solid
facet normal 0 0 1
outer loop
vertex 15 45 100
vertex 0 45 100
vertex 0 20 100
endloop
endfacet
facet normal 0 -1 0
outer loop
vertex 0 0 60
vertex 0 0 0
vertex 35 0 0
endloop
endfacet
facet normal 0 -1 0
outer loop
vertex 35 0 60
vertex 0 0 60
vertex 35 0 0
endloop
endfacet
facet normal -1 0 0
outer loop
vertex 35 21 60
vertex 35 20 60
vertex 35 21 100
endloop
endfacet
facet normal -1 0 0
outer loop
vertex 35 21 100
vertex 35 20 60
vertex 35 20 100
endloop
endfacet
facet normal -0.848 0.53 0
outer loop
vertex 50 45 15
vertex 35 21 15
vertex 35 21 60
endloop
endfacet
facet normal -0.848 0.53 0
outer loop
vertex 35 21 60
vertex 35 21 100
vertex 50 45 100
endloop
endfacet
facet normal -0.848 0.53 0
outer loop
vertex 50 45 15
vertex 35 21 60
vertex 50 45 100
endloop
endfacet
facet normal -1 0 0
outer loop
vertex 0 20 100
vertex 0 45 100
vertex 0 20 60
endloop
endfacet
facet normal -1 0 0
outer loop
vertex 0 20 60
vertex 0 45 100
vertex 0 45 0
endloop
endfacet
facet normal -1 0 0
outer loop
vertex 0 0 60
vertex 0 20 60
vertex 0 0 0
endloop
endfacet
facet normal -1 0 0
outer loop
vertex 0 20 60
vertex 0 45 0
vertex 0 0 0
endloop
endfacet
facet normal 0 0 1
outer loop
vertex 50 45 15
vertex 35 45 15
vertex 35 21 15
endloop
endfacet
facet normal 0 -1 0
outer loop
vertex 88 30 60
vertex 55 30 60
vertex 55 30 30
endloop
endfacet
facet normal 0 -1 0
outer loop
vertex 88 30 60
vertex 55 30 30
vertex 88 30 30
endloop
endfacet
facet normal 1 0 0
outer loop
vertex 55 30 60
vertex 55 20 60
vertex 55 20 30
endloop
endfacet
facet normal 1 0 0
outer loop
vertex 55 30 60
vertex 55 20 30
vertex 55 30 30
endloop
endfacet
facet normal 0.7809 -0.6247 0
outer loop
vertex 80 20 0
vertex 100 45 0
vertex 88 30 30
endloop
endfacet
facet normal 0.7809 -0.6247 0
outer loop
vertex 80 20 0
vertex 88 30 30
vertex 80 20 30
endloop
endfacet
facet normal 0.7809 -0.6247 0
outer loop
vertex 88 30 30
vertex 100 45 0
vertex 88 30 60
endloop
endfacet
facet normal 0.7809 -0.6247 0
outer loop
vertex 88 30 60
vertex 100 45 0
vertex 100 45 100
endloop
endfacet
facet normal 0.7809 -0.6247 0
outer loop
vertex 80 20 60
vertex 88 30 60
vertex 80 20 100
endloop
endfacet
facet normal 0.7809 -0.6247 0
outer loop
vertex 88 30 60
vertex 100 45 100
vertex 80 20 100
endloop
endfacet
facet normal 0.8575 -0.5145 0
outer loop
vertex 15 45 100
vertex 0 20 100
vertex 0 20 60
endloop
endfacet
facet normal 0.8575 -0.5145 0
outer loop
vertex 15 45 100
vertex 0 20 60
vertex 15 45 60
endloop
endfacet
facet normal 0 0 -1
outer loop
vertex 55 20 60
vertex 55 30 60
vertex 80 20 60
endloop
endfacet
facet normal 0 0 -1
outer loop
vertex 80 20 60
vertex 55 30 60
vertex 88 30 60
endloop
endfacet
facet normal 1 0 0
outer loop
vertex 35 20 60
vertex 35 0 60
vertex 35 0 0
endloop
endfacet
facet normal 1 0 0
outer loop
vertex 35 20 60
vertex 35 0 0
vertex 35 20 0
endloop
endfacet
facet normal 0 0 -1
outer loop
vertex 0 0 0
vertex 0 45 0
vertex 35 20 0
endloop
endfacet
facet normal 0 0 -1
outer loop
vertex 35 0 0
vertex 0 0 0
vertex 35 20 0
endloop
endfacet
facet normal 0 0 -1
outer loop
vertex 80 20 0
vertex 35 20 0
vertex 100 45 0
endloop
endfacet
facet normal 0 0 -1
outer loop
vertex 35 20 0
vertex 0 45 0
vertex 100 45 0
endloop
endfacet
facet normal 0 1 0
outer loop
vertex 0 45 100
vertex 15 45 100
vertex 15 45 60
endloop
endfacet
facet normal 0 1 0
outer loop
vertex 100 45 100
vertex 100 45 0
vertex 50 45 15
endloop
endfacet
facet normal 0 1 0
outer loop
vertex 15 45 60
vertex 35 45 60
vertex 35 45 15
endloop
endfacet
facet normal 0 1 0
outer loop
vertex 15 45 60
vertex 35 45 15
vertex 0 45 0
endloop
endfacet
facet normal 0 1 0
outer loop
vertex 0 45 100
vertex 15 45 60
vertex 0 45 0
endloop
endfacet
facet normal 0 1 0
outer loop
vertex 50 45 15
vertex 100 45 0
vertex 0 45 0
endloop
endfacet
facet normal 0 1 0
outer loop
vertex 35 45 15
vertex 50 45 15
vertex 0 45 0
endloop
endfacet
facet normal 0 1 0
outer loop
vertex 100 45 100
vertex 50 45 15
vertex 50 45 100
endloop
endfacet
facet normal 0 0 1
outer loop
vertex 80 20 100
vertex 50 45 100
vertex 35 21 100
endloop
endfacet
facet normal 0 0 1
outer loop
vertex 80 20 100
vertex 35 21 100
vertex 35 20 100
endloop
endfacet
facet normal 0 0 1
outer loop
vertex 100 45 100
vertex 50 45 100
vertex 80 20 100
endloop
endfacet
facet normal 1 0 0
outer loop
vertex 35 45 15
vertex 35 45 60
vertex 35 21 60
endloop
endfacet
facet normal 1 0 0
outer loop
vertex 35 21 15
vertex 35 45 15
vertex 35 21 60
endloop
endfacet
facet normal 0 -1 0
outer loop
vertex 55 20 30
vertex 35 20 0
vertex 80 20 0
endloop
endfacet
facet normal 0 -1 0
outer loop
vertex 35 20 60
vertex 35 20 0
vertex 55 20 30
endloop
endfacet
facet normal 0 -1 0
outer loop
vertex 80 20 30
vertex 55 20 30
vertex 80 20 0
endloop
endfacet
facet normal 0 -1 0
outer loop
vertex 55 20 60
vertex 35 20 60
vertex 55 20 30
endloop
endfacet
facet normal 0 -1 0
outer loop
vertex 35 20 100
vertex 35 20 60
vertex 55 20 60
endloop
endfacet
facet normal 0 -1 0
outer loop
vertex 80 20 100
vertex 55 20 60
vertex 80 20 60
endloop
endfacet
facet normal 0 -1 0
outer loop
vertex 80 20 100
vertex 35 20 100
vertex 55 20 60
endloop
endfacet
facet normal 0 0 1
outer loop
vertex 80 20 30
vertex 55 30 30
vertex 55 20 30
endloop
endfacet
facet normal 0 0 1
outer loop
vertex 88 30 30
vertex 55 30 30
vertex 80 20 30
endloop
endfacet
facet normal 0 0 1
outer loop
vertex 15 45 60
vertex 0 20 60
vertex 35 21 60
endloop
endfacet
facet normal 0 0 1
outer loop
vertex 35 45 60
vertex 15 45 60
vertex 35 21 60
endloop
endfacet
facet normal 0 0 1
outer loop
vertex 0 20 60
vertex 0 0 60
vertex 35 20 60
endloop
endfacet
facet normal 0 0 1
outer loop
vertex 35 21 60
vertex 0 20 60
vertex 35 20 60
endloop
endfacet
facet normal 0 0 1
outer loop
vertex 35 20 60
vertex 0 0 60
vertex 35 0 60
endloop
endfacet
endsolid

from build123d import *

# Parameters (mm, degrees)
F0_W      = 100
F0_H      = 45
F1_DEPTH  = 100
F2_W      = 65
F2_H      = 20
F3_DEPTH  = 100.001
F4_W      = 35
F4_H      = 40
F5_DEPTH  = 45.001
F7_DEPTH  = 40
F9_DEPTH  = 85
F10_W     = 33
F10_H     = 10
F11_DEPTH = 70
F12_W     = 33
F12_H     = 40
F13_DEPTH = 10
F15_DEPTH = 100.001


with BuildPart() as f1:
    # F0 (on Top) → F1 (new body)
    with BuildSketch(Plane.XY):
        with Locations((50, 22.5)):
            Rectangle(F0_W, F0_H)
    extrude(amount=F1_DEPTH)

    # F2 (on face) → F3 (cut, through all)
    with BuildSketch(Plane.XY.offset(100)):
        with Locations((67.5, 10)):
            Rectangle(F2_W, F2_H)
    extrude(amount=-F3_DEPTH, mode=Mode.SUBTRACT)

    # F4 (on face) → F5 (cut, through all)
    with BuildSketch(Plane.XZ):
        with Locations((17.5, 80)):
            Rectangle(F4_W, F4_H)
    extrude(amount=-F5_DEPTH, mode=Mode.SUBTRACT)

    # F6 (on face) → F7 (join)
    with BuildSketch(Plane.XY.offset(60)):
        Polygon((0, 20), (15, 45), (0, 45), align=None)
    extrude(amount=F7_DEPTH)

    # F8 (on face) → F9 (cut)
    with BuildSketch(Plane.XY.offset(100)):
        Polygon((35, 21), (50, 45), (35, 45), align=None)
    extrude(amount=-F9_DEPTH, mode=Mode.SUBTRACT)

    # F10 (on face) → F11 (cut)
    with BuildSketch(Plane.XY.offset(100)):
        with Locations((71.5, 25)):
            Rectangle(F10_W, F10_H)
    extrude(amount=-F11_DEPTH, mode=Mode.SUBTRACT)

    # F12 (on face) → F13 (join)
    with BuildSketch(Plane.XZ.offset(-30)):
        with Locations((71.5, 80)):
            Rectangle(F12_W, F12_H)
    extrude(amount=F13_DEPTH)

    # F14 (on face) → F15 (cut, through all)
    with BuildSketch(Plane.XY.offset(100)):
        Polygon((100, 20), (100, 45), (80, 20), align=None)
    extrude(amount=-F15_DEPTH, mode=Mode.SUBTRACT)


solid = f1.part
